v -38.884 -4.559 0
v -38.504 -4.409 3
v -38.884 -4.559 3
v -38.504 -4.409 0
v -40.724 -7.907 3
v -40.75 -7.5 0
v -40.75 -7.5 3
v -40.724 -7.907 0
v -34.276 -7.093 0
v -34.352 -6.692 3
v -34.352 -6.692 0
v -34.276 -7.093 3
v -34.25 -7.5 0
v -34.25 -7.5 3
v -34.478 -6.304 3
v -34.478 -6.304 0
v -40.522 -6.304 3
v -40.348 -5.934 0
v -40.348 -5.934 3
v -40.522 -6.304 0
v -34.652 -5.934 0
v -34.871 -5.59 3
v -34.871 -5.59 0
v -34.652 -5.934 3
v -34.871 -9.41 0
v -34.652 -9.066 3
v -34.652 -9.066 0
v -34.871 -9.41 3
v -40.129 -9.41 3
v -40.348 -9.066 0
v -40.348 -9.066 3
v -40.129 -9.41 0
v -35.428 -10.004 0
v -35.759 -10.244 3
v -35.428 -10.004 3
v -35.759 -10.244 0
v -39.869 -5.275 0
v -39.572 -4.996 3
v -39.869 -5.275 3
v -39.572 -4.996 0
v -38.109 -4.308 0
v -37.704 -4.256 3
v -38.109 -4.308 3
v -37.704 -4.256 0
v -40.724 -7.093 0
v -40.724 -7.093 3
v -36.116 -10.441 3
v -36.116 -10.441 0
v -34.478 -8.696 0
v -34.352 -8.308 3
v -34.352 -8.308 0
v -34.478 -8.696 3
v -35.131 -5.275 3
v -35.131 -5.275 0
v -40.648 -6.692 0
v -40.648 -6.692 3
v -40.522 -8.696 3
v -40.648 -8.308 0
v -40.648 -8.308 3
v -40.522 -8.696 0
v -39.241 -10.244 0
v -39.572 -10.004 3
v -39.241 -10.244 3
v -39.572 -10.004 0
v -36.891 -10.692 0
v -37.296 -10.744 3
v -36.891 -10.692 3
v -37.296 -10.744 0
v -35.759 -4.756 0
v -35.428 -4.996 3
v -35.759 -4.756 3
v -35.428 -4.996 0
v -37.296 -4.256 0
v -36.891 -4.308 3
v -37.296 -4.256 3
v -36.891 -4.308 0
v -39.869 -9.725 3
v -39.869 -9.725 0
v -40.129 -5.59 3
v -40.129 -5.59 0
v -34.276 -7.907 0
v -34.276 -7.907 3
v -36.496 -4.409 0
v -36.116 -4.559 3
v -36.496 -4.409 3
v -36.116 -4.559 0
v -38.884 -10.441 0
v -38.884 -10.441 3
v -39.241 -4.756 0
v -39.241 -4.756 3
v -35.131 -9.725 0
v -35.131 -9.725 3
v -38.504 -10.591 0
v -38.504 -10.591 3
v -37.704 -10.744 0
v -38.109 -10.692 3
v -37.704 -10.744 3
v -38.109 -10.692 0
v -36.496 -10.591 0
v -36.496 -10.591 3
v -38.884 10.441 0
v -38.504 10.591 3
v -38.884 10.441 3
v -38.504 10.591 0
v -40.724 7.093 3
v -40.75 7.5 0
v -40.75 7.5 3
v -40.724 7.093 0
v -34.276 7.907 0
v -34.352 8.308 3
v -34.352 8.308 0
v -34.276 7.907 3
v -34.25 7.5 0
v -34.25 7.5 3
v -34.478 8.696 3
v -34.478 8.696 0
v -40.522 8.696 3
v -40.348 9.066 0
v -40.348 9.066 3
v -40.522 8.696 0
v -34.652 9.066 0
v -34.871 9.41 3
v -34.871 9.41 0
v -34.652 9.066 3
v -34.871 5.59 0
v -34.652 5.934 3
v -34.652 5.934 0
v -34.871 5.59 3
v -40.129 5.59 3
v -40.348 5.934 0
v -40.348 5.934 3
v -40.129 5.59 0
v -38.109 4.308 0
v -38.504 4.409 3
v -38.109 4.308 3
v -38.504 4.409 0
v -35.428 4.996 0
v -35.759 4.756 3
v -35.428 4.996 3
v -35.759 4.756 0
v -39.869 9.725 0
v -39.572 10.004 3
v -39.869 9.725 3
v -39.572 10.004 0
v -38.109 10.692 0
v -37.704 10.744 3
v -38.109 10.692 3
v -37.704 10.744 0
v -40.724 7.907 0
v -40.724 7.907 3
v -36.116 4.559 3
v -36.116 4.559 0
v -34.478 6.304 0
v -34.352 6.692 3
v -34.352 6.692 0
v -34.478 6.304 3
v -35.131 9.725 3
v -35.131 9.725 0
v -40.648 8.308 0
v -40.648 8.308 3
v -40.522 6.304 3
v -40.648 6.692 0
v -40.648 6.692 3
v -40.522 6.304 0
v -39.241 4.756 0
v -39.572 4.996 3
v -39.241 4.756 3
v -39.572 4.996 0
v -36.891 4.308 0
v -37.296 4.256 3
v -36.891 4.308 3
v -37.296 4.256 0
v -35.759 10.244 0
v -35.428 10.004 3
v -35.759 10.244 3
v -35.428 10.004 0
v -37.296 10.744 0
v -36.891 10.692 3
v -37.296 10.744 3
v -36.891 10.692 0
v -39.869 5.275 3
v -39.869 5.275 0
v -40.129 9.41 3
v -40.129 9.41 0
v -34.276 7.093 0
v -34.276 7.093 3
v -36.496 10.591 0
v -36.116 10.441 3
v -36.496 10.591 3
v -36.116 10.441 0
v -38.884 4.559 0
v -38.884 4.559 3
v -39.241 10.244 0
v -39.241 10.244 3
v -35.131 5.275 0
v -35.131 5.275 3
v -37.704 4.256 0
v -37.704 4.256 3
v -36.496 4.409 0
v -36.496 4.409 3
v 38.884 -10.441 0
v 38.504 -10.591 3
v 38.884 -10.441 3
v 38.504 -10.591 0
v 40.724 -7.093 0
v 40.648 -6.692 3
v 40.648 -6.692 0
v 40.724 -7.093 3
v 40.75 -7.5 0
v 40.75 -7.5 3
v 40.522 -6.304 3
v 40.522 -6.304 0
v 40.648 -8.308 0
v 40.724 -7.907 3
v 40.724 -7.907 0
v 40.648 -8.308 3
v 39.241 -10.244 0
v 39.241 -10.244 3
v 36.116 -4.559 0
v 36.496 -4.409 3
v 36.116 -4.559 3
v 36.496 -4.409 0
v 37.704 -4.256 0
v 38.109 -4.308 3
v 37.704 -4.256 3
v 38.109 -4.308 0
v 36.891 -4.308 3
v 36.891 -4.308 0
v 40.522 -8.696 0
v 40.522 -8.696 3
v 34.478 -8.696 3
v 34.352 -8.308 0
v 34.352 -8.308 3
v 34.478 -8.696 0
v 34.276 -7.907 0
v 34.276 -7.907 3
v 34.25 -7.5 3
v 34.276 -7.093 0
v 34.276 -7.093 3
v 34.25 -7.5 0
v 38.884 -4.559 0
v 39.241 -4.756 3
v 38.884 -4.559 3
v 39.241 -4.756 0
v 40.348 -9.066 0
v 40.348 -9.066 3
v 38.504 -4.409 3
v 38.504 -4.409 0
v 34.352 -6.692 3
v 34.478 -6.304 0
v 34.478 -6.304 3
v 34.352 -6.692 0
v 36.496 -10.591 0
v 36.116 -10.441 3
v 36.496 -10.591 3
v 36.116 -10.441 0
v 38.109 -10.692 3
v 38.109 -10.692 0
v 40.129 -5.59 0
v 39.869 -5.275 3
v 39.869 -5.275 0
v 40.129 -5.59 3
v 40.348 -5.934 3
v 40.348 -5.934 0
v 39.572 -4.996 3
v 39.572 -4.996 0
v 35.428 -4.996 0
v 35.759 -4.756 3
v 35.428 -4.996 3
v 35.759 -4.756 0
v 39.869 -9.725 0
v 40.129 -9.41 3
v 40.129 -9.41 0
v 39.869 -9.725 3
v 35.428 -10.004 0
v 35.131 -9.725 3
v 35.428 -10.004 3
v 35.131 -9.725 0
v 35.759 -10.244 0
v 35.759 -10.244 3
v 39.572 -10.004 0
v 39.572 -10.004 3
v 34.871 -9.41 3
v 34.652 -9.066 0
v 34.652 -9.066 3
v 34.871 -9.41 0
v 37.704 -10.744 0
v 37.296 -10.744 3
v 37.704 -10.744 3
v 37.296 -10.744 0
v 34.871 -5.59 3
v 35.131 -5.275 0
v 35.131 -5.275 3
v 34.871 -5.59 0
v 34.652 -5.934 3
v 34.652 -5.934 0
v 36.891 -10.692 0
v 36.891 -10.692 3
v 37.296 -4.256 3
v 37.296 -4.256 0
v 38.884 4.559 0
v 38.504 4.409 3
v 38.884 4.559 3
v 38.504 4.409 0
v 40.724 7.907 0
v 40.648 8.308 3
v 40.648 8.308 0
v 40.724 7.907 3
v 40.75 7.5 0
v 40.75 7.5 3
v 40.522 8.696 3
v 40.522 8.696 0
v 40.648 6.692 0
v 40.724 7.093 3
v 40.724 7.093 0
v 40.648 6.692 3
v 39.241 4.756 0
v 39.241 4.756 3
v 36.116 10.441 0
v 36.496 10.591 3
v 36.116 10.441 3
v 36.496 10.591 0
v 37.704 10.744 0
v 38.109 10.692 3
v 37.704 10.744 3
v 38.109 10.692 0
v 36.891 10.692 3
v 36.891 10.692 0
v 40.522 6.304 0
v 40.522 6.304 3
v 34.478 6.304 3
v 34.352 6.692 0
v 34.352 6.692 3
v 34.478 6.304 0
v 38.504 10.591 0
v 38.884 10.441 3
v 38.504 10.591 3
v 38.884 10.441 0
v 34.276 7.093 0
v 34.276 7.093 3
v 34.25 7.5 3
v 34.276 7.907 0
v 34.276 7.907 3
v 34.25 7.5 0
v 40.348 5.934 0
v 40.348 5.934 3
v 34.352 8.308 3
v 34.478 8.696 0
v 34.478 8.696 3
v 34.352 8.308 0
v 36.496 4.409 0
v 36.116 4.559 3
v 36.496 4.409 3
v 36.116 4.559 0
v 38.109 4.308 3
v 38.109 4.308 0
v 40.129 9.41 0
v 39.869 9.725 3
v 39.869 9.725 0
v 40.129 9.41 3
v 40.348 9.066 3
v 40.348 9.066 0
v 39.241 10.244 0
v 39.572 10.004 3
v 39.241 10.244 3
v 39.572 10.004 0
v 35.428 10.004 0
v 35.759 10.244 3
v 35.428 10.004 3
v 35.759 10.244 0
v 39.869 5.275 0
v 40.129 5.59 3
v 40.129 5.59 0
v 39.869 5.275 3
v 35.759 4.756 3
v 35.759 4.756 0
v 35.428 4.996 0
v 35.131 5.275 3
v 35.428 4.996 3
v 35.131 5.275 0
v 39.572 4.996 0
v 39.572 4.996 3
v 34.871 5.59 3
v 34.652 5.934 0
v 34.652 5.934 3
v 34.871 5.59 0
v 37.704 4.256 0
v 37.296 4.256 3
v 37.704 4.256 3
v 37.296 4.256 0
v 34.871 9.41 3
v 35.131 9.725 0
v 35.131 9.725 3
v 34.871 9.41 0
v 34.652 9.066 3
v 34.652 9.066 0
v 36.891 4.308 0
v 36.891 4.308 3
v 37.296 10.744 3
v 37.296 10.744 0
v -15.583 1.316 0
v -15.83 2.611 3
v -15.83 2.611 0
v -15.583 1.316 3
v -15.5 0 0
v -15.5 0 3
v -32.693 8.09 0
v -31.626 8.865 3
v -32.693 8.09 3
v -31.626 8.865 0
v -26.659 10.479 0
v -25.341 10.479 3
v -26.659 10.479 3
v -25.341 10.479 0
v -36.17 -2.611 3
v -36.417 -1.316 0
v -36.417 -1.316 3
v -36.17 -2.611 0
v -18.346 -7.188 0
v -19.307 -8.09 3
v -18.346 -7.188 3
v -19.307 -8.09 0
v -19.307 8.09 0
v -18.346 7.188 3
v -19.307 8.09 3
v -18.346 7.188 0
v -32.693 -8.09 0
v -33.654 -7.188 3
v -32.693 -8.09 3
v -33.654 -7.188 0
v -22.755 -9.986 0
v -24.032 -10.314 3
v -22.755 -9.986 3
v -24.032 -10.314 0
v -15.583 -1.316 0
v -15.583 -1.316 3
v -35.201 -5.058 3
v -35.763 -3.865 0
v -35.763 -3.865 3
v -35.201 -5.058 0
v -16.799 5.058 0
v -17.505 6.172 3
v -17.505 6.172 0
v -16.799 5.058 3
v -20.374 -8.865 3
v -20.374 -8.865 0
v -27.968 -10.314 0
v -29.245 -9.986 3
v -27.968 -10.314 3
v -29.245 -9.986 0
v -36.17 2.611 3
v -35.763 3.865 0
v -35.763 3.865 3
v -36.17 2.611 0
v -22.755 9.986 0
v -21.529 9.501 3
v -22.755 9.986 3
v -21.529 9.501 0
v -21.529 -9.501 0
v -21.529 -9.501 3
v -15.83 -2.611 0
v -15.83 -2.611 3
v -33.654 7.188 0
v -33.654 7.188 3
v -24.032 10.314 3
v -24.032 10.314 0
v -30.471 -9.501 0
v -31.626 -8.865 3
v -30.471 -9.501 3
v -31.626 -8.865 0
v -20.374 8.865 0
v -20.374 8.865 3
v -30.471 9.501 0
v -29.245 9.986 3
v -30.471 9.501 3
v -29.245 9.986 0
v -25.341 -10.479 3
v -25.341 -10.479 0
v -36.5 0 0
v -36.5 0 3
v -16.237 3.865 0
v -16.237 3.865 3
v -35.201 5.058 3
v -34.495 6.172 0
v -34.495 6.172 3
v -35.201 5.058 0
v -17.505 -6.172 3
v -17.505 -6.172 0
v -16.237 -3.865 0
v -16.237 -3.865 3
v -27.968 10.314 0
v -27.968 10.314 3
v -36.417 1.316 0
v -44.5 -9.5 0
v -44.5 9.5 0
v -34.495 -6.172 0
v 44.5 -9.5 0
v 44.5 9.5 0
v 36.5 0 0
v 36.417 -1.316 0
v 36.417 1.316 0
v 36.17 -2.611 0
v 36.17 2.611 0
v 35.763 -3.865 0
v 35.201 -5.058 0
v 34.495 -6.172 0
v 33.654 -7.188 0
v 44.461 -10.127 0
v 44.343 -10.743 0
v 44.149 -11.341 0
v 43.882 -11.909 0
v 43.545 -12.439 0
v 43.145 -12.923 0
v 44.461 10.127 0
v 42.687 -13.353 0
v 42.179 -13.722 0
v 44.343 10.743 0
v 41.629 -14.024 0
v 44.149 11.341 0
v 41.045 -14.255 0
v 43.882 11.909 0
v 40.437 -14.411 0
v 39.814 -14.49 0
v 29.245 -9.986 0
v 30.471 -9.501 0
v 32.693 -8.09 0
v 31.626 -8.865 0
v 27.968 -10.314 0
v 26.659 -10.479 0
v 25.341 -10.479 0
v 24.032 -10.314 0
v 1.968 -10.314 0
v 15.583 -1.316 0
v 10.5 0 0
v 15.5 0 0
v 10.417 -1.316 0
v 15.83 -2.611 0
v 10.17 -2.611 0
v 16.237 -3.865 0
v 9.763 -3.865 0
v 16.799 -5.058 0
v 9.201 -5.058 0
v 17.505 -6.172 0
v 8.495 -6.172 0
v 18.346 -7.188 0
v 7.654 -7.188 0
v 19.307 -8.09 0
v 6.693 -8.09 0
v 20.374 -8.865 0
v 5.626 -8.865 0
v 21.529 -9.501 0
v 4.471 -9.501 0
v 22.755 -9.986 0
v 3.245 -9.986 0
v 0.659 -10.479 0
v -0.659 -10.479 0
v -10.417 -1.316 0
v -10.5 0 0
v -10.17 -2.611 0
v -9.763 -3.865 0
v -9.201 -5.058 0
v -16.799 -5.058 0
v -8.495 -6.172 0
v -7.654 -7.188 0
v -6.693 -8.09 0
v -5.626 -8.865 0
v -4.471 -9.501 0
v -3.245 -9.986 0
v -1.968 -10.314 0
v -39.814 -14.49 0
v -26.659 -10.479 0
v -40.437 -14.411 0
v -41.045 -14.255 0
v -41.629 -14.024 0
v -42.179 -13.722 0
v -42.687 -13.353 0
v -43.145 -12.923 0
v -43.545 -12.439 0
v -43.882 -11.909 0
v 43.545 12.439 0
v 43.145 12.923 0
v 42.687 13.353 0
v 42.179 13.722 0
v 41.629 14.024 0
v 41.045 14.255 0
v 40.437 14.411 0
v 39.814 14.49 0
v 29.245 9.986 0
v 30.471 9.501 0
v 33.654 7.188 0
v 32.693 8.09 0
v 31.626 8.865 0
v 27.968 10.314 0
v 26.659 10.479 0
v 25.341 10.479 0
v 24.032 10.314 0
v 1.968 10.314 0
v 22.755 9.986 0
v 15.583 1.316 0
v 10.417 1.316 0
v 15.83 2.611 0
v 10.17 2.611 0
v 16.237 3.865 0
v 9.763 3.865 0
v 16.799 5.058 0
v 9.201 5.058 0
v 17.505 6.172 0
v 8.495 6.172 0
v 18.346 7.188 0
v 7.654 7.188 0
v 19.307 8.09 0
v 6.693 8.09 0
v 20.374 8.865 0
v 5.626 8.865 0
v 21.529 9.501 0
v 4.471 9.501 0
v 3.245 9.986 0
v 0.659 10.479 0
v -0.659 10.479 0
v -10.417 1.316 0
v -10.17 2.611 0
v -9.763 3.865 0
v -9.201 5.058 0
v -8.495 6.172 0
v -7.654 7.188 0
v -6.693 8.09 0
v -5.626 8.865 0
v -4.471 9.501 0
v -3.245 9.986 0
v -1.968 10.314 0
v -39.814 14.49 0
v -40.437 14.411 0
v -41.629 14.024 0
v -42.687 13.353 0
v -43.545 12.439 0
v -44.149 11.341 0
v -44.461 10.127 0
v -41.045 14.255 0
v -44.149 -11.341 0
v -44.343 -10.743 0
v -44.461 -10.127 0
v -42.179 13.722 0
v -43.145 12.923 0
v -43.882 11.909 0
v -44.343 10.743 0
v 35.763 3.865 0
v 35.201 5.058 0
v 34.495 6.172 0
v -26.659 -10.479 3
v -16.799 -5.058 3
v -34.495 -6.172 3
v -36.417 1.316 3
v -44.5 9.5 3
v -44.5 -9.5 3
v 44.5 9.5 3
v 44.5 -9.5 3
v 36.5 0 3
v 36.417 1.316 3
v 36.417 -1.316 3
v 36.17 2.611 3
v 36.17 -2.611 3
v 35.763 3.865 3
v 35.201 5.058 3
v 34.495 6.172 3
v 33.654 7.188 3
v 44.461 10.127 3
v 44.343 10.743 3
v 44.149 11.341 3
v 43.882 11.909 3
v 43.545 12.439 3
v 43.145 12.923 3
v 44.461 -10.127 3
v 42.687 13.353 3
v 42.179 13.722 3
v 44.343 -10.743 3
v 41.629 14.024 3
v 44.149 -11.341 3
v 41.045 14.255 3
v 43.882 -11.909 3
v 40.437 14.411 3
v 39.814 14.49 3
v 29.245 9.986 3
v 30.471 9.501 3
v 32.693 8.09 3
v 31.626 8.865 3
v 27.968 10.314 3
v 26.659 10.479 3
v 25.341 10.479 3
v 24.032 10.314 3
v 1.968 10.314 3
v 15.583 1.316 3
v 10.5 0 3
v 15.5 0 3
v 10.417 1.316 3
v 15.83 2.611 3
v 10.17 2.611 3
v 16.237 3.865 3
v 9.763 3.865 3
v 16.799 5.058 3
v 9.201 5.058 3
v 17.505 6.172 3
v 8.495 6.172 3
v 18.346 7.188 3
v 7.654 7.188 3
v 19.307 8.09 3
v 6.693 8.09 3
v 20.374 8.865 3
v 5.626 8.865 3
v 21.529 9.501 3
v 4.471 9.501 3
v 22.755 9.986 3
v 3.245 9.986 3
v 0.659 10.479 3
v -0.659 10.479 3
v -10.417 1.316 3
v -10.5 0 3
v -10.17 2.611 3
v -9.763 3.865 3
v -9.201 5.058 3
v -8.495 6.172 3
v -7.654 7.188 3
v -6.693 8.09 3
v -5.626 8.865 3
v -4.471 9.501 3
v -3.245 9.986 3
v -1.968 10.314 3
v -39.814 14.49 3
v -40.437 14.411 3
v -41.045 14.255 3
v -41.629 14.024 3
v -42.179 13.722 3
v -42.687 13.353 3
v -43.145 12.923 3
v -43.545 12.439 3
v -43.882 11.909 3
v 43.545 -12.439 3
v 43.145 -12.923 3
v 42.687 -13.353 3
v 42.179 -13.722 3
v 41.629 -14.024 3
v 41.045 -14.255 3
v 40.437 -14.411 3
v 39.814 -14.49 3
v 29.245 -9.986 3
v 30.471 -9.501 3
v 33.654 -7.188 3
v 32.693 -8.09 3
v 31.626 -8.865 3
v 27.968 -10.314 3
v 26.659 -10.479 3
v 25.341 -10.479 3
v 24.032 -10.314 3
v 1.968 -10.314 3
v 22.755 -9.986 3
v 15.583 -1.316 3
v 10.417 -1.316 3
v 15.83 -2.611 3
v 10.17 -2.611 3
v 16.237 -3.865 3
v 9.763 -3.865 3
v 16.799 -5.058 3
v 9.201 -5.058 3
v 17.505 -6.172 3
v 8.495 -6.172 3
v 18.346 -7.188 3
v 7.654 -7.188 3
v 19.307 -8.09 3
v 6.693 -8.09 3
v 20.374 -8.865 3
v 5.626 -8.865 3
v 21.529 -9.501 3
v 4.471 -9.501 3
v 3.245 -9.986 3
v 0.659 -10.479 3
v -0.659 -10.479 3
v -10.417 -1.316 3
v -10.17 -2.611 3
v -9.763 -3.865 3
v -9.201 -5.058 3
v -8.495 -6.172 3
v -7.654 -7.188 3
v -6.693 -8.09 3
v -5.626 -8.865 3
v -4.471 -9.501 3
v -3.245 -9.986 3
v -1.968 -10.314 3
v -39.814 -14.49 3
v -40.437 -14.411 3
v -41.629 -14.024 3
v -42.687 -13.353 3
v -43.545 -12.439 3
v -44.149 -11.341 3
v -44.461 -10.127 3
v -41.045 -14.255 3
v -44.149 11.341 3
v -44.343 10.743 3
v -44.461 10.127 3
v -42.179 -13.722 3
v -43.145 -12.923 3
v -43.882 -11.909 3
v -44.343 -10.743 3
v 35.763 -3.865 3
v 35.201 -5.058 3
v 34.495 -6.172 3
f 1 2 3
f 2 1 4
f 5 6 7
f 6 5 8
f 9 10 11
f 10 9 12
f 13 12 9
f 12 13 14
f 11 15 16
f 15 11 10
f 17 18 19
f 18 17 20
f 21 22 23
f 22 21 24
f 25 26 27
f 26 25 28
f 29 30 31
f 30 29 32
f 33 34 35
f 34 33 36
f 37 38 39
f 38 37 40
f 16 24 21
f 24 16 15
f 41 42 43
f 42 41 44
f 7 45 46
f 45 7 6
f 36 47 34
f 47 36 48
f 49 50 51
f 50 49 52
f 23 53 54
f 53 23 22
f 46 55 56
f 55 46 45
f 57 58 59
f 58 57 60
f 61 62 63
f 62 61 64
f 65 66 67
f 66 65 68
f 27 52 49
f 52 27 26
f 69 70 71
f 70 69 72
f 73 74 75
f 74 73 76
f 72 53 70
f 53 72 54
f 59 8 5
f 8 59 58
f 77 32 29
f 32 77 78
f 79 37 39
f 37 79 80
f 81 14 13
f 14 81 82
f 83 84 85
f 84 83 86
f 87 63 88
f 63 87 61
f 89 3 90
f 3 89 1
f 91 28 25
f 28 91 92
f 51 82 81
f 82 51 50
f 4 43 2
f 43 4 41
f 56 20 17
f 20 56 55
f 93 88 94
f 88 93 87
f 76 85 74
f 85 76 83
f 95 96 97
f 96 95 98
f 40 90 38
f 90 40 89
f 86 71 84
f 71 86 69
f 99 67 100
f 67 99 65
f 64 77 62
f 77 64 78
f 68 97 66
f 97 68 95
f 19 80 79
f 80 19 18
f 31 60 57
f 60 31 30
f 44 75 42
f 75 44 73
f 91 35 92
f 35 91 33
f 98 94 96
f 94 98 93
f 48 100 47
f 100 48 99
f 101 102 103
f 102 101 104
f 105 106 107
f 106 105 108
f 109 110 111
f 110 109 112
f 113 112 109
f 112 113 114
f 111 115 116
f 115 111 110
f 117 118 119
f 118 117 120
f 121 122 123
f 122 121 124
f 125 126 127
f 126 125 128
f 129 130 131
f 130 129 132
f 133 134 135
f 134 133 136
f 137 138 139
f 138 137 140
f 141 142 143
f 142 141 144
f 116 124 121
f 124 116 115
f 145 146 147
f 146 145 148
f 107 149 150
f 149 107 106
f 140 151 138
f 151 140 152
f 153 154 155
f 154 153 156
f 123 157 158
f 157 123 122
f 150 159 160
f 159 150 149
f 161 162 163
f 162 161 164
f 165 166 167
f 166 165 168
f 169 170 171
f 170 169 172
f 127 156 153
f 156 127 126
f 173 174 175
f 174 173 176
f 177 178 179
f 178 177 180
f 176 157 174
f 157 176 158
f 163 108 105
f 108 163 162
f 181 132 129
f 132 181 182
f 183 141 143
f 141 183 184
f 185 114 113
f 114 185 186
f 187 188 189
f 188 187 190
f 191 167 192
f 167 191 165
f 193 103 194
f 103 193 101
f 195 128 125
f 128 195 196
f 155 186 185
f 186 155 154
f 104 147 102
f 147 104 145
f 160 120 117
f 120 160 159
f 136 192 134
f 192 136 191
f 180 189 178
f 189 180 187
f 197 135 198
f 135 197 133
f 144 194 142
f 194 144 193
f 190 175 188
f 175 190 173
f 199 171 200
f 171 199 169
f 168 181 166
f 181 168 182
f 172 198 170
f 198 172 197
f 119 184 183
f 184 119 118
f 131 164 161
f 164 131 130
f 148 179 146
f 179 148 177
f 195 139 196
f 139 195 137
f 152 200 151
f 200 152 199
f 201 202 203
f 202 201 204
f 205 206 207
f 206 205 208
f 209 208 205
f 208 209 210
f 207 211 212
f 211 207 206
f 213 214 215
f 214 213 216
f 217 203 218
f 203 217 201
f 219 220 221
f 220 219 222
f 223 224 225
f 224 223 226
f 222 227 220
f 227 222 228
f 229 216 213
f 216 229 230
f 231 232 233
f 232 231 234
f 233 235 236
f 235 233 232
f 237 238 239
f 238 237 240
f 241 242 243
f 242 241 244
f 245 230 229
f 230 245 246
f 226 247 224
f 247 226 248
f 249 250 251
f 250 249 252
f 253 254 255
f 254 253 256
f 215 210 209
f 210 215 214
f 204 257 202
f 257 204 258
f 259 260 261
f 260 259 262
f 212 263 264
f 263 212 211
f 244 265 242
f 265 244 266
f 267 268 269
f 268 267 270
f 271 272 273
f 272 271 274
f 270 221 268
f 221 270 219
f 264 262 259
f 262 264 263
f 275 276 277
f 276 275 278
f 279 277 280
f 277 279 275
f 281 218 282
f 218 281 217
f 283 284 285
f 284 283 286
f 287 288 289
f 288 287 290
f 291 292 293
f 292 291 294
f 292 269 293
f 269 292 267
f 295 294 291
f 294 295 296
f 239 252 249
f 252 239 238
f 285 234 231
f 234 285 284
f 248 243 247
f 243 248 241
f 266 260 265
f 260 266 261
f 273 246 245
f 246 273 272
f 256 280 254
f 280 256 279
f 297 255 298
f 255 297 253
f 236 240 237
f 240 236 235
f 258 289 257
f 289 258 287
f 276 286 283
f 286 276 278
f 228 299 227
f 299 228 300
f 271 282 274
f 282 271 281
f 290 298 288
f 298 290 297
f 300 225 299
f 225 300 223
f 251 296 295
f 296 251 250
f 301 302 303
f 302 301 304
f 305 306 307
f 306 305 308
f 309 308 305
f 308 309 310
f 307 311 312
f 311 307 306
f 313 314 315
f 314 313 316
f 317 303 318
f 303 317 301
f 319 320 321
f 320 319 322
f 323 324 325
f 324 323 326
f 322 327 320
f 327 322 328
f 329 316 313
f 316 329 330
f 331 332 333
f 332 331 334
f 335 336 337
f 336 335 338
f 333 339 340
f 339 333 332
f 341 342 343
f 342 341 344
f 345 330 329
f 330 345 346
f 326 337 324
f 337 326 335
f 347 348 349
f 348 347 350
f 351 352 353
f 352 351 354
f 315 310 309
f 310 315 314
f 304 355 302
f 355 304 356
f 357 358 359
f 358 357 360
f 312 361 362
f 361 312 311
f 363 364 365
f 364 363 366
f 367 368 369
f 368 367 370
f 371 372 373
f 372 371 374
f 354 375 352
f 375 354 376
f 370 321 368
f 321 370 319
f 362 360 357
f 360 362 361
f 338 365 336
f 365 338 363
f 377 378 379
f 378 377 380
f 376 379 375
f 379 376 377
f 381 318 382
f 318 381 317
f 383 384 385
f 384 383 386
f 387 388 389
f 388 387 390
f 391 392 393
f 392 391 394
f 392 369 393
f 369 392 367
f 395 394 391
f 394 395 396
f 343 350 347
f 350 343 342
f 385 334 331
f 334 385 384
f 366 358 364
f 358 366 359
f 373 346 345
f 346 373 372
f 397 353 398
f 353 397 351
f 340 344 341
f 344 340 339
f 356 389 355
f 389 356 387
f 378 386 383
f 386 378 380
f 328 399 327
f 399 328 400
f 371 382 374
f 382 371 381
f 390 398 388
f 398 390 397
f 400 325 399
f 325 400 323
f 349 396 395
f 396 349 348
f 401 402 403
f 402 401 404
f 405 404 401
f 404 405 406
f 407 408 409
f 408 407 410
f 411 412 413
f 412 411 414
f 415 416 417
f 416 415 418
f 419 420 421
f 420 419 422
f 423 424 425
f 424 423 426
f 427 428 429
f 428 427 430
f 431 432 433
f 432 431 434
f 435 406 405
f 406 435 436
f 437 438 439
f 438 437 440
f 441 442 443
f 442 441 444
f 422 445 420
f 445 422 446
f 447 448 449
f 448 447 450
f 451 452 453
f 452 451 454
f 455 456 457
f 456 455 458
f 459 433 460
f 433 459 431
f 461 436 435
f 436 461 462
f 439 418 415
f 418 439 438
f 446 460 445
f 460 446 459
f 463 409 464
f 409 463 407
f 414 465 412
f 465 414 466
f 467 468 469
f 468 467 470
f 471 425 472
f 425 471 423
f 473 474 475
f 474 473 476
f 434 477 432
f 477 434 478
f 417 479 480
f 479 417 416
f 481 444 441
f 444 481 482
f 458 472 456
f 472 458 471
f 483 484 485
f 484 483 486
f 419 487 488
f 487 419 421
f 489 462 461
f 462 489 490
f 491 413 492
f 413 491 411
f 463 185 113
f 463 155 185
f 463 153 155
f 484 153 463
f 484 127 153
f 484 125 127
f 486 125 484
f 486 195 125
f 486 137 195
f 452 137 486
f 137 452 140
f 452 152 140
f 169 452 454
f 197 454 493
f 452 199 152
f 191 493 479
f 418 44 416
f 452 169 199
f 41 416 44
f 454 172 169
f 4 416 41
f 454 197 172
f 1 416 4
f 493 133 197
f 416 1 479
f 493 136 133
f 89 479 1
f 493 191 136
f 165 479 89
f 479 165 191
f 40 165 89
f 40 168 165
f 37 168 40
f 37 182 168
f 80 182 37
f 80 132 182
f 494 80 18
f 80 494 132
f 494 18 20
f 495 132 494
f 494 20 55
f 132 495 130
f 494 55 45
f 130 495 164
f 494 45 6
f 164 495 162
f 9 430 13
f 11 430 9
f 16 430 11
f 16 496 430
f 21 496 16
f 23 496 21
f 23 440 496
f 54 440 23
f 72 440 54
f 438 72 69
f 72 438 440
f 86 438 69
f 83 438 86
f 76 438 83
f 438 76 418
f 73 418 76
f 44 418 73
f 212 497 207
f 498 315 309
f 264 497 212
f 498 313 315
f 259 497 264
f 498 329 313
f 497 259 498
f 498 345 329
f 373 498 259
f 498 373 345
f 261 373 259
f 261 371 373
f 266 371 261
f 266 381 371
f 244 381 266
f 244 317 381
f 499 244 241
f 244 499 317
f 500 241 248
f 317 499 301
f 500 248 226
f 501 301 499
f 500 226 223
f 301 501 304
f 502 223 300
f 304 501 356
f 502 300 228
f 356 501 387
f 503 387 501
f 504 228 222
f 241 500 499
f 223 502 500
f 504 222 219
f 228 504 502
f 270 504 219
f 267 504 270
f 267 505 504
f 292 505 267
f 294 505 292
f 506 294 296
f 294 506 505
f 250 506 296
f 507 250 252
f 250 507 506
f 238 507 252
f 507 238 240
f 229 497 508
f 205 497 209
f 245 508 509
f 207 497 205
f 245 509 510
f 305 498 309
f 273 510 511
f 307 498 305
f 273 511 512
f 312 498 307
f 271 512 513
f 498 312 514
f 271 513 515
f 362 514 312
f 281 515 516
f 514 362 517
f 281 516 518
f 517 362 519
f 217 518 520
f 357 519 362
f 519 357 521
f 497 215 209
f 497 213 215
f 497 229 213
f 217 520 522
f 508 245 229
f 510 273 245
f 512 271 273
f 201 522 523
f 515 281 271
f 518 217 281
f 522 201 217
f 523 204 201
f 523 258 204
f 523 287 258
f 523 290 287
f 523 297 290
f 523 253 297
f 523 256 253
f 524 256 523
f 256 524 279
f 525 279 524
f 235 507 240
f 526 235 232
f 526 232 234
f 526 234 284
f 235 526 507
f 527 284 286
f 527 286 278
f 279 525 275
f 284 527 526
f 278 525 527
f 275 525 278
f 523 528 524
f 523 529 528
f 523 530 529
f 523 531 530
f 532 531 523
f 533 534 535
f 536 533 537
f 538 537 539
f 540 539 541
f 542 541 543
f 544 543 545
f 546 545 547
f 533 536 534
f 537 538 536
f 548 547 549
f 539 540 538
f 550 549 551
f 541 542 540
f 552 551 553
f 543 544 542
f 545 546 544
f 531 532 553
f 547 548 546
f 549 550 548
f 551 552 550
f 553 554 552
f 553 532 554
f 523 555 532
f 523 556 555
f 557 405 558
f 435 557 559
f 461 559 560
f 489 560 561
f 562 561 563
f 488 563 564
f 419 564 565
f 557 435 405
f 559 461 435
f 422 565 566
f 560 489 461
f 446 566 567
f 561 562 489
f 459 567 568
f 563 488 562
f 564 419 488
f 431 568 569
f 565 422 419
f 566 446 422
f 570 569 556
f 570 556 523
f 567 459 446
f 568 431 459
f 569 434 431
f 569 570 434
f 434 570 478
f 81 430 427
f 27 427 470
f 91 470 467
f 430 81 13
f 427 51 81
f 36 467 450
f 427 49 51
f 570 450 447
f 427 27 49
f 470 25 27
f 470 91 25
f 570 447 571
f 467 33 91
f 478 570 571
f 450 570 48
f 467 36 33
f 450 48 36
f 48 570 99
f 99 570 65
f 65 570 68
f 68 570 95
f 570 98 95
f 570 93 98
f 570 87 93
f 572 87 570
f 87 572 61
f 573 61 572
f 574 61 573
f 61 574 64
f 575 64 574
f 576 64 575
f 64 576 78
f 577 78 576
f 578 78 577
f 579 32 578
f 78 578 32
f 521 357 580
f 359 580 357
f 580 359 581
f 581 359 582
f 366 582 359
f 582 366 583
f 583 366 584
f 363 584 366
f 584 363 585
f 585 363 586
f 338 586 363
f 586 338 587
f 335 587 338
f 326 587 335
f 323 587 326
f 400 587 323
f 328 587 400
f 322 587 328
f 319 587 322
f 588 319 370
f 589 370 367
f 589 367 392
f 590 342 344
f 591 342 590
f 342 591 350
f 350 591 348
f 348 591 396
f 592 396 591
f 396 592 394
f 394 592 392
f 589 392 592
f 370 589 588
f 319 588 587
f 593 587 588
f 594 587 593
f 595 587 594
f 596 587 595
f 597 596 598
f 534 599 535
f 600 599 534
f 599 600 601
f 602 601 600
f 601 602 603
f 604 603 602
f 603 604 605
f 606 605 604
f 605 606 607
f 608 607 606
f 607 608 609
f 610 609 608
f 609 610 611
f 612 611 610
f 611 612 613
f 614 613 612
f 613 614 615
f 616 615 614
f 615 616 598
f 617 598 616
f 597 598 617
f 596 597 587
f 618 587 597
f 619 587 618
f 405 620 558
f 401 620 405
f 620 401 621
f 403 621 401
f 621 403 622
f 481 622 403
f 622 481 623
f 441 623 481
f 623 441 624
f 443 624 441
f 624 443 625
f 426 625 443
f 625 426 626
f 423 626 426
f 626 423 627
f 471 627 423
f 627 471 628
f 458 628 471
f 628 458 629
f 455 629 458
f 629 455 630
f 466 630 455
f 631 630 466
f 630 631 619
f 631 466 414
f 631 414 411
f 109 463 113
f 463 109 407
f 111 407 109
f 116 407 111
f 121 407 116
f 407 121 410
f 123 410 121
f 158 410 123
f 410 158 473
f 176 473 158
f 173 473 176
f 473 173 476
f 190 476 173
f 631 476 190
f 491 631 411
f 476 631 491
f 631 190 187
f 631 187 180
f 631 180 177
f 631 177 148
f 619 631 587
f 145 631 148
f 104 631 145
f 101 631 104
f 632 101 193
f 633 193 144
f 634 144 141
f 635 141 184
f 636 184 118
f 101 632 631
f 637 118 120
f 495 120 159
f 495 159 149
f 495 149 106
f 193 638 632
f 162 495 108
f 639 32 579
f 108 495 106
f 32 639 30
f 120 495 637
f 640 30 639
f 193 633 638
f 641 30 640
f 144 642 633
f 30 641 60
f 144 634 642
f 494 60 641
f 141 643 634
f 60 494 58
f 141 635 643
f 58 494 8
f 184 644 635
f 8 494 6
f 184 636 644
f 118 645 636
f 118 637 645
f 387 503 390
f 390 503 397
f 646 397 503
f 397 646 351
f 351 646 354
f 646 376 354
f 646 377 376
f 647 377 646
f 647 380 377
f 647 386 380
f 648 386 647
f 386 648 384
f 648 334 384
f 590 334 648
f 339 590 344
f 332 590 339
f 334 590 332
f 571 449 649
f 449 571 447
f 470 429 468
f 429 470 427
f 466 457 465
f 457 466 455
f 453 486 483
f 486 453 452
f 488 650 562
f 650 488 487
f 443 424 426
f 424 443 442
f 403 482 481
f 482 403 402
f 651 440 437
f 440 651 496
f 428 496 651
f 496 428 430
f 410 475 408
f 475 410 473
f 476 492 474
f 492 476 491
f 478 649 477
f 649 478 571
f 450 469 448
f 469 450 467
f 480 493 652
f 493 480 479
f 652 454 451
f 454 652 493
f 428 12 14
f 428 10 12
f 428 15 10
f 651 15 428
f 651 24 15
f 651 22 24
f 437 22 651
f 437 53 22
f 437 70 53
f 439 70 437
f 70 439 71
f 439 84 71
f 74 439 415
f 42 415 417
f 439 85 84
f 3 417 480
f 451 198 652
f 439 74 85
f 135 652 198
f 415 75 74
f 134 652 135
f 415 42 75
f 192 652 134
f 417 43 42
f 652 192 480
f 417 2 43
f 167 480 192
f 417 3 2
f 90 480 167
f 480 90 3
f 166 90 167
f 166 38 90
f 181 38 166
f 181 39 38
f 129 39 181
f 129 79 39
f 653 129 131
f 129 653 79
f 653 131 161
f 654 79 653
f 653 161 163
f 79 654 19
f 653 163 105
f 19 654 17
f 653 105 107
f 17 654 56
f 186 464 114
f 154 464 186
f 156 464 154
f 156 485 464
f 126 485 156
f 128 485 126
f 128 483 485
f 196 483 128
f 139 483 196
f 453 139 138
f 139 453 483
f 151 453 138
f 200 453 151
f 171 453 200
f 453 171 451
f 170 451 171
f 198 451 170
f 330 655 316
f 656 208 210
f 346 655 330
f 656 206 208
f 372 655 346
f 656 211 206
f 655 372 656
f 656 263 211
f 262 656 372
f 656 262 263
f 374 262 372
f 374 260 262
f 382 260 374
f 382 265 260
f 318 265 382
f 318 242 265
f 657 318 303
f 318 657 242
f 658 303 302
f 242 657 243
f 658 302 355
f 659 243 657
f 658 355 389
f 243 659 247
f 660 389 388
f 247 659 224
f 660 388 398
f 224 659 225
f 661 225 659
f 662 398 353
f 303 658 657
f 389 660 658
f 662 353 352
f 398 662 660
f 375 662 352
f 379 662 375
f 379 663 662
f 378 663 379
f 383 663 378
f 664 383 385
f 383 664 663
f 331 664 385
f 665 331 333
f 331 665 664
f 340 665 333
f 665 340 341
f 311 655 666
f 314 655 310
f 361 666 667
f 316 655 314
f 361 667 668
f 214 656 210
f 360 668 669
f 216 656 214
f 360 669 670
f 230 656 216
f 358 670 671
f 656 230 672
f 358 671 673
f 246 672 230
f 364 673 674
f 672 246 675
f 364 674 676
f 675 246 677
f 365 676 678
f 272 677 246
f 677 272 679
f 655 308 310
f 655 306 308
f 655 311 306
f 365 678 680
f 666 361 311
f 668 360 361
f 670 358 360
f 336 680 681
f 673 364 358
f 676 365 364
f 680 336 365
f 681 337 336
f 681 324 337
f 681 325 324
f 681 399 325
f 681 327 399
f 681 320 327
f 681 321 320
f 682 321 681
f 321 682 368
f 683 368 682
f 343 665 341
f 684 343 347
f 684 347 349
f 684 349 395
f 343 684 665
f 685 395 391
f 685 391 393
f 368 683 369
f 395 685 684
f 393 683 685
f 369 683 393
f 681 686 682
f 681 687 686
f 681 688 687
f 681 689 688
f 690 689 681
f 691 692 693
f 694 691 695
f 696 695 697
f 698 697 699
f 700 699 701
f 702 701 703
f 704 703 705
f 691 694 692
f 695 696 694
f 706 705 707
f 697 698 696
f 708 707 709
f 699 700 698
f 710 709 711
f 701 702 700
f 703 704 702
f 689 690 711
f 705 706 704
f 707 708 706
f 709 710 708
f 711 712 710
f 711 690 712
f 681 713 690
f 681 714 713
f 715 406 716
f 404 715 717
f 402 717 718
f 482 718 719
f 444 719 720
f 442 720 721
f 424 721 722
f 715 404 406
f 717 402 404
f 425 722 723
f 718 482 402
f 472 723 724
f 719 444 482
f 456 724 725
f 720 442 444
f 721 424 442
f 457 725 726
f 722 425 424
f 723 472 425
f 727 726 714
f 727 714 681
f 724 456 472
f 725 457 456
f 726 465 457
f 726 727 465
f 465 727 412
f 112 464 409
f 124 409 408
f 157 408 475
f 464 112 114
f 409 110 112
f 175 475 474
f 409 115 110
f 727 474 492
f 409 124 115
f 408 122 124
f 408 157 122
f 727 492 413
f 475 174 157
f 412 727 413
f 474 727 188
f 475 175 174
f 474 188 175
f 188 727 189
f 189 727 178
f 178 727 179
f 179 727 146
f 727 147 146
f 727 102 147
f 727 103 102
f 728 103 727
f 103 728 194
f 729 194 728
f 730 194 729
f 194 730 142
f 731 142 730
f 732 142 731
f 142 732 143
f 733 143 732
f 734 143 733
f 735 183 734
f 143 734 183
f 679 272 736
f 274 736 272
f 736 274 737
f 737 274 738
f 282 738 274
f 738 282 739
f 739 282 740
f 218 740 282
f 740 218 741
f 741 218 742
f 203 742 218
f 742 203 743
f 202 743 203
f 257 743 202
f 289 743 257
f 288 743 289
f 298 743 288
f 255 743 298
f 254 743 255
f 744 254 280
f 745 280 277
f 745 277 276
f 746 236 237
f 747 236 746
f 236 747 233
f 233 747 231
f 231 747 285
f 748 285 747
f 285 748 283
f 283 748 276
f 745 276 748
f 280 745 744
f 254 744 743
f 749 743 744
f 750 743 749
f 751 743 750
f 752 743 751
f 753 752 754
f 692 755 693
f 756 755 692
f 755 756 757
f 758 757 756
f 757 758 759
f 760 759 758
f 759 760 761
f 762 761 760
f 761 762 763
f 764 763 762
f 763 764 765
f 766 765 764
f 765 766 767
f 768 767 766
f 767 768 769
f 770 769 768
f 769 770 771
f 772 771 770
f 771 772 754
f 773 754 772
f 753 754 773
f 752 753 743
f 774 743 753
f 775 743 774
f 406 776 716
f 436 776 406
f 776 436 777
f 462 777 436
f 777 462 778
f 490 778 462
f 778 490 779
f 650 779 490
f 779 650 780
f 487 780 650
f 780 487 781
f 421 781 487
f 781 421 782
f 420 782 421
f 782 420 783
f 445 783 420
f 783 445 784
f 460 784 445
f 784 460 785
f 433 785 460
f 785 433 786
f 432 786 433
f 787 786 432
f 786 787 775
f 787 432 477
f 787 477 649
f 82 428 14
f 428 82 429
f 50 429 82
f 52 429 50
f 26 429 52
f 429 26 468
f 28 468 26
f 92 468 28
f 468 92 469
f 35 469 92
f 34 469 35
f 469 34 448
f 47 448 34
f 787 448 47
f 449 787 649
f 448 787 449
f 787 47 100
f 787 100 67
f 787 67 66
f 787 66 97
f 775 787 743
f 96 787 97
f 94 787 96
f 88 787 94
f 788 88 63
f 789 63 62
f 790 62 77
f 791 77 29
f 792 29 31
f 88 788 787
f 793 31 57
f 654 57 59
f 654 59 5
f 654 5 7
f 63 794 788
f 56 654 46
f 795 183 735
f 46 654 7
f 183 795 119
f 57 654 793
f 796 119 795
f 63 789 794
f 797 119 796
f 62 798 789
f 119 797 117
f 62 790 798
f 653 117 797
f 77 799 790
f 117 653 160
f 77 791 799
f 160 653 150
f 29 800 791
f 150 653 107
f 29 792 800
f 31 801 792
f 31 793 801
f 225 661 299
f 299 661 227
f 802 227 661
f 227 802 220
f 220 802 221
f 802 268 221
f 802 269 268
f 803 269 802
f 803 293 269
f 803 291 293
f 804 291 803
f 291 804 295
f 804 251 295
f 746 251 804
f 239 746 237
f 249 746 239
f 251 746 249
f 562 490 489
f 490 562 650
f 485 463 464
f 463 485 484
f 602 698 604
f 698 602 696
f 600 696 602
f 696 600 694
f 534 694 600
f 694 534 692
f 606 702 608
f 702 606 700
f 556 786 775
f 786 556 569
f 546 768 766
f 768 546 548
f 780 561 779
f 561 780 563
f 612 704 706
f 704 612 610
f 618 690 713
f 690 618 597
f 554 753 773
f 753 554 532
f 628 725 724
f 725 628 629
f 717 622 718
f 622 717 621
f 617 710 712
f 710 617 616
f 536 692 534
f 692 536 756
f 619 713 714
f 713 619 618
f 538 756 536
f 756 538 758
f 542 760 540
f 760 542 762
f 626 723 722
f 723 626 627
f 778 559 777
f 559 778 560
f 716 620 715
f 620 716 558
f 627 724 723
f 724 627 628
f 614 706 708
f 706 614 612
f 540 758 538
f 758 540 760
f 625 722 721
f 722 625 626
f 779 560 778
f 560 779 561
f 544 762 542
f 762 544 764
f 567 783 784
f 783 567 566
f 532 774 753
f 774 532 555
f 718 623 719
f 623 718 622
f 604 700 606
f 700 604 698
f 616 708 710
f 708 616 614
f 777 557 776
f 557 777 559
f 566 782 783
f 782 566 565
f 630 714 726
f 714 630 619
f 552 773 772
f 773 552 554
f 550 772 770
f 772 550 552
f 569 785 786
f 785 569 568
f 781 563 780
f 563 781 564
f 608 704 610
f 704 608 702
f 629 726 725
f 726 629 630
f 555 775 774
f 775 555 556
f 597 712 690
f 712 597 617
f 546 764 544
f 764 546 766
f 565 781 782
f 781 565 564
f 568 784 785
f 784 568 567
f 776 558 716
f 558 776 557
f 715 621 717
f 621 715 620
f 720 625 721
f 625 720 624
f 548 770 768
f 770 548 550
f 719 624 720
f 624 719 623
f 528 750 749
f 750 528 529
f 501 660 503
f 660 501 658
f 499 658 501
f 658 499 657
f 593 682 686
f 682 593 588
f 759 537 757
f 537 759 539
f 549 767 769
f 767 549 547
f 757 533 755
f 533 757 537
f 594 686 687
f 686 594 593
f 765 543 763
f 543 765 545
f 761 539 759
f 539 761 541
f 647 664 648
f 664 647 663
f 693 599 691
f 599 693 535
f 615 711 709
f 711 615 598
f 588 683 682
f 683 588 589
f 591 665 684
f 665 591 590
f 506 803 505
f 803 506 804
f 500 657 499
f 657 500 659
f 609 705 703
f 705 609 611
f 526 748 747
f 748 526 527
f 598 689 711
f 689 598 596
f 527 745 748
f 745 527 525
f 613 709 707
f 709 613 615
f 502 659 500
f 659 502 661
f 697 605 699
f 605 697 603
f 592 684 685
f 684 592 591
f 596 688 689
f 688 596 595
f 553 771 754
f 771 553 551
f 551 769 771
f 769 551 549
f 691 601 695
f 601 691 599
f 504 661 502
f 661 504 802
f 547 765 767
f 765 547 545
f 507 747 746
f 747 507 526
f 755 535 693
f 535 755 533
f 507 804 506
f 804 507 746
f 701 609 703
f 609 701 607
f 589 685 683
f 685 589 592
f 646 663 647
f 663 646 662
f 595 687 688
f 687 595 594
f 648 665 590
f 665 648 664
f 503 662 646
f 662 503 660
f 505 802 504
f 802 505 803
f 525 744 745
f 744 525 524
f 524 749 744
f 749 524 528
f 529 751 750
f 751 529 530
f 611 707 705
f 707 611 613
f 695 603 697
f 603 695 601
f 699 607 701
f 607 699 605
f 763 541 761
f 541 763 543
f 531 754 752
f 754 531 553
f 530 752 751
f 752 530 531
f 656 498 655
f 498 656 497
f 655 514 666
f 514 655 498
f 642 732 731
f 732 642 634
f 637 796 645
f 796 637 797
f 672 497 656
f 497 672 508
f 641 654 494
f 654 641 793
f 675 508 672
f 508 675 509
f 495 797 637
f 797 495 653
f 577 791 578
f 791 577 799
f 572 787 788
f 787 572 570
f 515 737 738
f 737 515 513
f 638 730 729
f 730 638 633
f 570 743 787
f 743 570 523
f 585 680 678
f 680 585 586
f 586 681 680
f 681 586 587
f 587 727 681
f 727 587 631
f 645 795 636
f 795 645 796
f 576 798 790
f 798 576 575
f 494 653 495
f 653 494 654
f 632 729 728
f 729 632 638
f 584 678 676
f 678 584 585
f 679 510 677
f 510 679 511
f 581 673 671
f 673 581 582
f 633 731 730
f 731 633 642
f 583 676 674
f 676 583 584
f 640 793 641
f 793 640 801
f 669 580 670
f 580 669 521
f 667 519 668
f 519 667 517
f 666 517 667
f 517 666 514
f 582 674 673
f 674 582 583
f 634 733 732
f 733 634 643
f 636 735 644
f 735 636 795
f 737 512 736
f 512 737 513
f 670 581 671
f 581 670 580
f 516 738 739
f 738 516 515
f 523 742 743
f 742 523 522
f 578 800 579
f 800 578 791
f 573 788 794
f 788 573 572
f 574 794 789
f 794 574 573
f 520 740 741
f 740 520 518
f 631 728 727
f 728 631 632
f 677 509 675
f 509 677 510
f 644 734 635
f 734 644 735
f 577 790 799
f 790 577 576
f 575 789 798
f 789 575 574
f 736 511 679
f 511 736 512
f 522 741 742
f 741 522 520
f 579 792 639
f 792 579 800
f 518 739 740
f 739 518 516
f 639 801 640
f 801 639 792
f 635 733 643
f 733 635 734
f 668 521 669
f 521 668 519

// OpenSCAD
$fn = 50;


difference() {
	union() {
		hull() {
			translate(v = [-39.5000000000, 9.5000000000, 0]) {
				cylinder(h = 3, r = 5);
			}
			translate(v = [39.5000000000, 9.5000000000, 0]) {
				cylinder(h = 3, r = 5);
			}
			translate(v = [-39.5000000000, -9.5000000000, 0]) {
				cylinder(h = 3, r = 5);
			}
			translate(v = [39.5000000000, -9.5000000000, 0]) {
				cylinder(h = 3, r = 5);
			}
		}
	}
	union() {
		#translate(v = [-37.5000000000, -7.5000000000, -100.0000000000]) {
			cylinder(h = 200, r = 3.2500000000);
		}
		#translate(v = [-37.5000000000, 7.5000000000, -100.0000000000]) {
			cylinder(h = 200, r = 3.2500000000);
		}
		#translate(v = [37.5000000000, -7.5000000000, -100.0000000000]) {
			cylinder(h = 200, r = 3.2500000000);
		}
		#translate(v = [37.5000000000, 7.5000000000, -100.0000000000]) {
			cylinder(h = 200, r = 3.2500000000);
		}
		#translate(v = [-26.0000000000, 0, 0]) {
			cylinder(h = 3, r = 10.5000000000);
		}
		#cylinder(h = 3, r = 10.5000000000);
		#translate(v = [26.0000000000, 0, 0]) {
			cylinder(h = 3, r = 10.5000000000);
		}
	}
}
